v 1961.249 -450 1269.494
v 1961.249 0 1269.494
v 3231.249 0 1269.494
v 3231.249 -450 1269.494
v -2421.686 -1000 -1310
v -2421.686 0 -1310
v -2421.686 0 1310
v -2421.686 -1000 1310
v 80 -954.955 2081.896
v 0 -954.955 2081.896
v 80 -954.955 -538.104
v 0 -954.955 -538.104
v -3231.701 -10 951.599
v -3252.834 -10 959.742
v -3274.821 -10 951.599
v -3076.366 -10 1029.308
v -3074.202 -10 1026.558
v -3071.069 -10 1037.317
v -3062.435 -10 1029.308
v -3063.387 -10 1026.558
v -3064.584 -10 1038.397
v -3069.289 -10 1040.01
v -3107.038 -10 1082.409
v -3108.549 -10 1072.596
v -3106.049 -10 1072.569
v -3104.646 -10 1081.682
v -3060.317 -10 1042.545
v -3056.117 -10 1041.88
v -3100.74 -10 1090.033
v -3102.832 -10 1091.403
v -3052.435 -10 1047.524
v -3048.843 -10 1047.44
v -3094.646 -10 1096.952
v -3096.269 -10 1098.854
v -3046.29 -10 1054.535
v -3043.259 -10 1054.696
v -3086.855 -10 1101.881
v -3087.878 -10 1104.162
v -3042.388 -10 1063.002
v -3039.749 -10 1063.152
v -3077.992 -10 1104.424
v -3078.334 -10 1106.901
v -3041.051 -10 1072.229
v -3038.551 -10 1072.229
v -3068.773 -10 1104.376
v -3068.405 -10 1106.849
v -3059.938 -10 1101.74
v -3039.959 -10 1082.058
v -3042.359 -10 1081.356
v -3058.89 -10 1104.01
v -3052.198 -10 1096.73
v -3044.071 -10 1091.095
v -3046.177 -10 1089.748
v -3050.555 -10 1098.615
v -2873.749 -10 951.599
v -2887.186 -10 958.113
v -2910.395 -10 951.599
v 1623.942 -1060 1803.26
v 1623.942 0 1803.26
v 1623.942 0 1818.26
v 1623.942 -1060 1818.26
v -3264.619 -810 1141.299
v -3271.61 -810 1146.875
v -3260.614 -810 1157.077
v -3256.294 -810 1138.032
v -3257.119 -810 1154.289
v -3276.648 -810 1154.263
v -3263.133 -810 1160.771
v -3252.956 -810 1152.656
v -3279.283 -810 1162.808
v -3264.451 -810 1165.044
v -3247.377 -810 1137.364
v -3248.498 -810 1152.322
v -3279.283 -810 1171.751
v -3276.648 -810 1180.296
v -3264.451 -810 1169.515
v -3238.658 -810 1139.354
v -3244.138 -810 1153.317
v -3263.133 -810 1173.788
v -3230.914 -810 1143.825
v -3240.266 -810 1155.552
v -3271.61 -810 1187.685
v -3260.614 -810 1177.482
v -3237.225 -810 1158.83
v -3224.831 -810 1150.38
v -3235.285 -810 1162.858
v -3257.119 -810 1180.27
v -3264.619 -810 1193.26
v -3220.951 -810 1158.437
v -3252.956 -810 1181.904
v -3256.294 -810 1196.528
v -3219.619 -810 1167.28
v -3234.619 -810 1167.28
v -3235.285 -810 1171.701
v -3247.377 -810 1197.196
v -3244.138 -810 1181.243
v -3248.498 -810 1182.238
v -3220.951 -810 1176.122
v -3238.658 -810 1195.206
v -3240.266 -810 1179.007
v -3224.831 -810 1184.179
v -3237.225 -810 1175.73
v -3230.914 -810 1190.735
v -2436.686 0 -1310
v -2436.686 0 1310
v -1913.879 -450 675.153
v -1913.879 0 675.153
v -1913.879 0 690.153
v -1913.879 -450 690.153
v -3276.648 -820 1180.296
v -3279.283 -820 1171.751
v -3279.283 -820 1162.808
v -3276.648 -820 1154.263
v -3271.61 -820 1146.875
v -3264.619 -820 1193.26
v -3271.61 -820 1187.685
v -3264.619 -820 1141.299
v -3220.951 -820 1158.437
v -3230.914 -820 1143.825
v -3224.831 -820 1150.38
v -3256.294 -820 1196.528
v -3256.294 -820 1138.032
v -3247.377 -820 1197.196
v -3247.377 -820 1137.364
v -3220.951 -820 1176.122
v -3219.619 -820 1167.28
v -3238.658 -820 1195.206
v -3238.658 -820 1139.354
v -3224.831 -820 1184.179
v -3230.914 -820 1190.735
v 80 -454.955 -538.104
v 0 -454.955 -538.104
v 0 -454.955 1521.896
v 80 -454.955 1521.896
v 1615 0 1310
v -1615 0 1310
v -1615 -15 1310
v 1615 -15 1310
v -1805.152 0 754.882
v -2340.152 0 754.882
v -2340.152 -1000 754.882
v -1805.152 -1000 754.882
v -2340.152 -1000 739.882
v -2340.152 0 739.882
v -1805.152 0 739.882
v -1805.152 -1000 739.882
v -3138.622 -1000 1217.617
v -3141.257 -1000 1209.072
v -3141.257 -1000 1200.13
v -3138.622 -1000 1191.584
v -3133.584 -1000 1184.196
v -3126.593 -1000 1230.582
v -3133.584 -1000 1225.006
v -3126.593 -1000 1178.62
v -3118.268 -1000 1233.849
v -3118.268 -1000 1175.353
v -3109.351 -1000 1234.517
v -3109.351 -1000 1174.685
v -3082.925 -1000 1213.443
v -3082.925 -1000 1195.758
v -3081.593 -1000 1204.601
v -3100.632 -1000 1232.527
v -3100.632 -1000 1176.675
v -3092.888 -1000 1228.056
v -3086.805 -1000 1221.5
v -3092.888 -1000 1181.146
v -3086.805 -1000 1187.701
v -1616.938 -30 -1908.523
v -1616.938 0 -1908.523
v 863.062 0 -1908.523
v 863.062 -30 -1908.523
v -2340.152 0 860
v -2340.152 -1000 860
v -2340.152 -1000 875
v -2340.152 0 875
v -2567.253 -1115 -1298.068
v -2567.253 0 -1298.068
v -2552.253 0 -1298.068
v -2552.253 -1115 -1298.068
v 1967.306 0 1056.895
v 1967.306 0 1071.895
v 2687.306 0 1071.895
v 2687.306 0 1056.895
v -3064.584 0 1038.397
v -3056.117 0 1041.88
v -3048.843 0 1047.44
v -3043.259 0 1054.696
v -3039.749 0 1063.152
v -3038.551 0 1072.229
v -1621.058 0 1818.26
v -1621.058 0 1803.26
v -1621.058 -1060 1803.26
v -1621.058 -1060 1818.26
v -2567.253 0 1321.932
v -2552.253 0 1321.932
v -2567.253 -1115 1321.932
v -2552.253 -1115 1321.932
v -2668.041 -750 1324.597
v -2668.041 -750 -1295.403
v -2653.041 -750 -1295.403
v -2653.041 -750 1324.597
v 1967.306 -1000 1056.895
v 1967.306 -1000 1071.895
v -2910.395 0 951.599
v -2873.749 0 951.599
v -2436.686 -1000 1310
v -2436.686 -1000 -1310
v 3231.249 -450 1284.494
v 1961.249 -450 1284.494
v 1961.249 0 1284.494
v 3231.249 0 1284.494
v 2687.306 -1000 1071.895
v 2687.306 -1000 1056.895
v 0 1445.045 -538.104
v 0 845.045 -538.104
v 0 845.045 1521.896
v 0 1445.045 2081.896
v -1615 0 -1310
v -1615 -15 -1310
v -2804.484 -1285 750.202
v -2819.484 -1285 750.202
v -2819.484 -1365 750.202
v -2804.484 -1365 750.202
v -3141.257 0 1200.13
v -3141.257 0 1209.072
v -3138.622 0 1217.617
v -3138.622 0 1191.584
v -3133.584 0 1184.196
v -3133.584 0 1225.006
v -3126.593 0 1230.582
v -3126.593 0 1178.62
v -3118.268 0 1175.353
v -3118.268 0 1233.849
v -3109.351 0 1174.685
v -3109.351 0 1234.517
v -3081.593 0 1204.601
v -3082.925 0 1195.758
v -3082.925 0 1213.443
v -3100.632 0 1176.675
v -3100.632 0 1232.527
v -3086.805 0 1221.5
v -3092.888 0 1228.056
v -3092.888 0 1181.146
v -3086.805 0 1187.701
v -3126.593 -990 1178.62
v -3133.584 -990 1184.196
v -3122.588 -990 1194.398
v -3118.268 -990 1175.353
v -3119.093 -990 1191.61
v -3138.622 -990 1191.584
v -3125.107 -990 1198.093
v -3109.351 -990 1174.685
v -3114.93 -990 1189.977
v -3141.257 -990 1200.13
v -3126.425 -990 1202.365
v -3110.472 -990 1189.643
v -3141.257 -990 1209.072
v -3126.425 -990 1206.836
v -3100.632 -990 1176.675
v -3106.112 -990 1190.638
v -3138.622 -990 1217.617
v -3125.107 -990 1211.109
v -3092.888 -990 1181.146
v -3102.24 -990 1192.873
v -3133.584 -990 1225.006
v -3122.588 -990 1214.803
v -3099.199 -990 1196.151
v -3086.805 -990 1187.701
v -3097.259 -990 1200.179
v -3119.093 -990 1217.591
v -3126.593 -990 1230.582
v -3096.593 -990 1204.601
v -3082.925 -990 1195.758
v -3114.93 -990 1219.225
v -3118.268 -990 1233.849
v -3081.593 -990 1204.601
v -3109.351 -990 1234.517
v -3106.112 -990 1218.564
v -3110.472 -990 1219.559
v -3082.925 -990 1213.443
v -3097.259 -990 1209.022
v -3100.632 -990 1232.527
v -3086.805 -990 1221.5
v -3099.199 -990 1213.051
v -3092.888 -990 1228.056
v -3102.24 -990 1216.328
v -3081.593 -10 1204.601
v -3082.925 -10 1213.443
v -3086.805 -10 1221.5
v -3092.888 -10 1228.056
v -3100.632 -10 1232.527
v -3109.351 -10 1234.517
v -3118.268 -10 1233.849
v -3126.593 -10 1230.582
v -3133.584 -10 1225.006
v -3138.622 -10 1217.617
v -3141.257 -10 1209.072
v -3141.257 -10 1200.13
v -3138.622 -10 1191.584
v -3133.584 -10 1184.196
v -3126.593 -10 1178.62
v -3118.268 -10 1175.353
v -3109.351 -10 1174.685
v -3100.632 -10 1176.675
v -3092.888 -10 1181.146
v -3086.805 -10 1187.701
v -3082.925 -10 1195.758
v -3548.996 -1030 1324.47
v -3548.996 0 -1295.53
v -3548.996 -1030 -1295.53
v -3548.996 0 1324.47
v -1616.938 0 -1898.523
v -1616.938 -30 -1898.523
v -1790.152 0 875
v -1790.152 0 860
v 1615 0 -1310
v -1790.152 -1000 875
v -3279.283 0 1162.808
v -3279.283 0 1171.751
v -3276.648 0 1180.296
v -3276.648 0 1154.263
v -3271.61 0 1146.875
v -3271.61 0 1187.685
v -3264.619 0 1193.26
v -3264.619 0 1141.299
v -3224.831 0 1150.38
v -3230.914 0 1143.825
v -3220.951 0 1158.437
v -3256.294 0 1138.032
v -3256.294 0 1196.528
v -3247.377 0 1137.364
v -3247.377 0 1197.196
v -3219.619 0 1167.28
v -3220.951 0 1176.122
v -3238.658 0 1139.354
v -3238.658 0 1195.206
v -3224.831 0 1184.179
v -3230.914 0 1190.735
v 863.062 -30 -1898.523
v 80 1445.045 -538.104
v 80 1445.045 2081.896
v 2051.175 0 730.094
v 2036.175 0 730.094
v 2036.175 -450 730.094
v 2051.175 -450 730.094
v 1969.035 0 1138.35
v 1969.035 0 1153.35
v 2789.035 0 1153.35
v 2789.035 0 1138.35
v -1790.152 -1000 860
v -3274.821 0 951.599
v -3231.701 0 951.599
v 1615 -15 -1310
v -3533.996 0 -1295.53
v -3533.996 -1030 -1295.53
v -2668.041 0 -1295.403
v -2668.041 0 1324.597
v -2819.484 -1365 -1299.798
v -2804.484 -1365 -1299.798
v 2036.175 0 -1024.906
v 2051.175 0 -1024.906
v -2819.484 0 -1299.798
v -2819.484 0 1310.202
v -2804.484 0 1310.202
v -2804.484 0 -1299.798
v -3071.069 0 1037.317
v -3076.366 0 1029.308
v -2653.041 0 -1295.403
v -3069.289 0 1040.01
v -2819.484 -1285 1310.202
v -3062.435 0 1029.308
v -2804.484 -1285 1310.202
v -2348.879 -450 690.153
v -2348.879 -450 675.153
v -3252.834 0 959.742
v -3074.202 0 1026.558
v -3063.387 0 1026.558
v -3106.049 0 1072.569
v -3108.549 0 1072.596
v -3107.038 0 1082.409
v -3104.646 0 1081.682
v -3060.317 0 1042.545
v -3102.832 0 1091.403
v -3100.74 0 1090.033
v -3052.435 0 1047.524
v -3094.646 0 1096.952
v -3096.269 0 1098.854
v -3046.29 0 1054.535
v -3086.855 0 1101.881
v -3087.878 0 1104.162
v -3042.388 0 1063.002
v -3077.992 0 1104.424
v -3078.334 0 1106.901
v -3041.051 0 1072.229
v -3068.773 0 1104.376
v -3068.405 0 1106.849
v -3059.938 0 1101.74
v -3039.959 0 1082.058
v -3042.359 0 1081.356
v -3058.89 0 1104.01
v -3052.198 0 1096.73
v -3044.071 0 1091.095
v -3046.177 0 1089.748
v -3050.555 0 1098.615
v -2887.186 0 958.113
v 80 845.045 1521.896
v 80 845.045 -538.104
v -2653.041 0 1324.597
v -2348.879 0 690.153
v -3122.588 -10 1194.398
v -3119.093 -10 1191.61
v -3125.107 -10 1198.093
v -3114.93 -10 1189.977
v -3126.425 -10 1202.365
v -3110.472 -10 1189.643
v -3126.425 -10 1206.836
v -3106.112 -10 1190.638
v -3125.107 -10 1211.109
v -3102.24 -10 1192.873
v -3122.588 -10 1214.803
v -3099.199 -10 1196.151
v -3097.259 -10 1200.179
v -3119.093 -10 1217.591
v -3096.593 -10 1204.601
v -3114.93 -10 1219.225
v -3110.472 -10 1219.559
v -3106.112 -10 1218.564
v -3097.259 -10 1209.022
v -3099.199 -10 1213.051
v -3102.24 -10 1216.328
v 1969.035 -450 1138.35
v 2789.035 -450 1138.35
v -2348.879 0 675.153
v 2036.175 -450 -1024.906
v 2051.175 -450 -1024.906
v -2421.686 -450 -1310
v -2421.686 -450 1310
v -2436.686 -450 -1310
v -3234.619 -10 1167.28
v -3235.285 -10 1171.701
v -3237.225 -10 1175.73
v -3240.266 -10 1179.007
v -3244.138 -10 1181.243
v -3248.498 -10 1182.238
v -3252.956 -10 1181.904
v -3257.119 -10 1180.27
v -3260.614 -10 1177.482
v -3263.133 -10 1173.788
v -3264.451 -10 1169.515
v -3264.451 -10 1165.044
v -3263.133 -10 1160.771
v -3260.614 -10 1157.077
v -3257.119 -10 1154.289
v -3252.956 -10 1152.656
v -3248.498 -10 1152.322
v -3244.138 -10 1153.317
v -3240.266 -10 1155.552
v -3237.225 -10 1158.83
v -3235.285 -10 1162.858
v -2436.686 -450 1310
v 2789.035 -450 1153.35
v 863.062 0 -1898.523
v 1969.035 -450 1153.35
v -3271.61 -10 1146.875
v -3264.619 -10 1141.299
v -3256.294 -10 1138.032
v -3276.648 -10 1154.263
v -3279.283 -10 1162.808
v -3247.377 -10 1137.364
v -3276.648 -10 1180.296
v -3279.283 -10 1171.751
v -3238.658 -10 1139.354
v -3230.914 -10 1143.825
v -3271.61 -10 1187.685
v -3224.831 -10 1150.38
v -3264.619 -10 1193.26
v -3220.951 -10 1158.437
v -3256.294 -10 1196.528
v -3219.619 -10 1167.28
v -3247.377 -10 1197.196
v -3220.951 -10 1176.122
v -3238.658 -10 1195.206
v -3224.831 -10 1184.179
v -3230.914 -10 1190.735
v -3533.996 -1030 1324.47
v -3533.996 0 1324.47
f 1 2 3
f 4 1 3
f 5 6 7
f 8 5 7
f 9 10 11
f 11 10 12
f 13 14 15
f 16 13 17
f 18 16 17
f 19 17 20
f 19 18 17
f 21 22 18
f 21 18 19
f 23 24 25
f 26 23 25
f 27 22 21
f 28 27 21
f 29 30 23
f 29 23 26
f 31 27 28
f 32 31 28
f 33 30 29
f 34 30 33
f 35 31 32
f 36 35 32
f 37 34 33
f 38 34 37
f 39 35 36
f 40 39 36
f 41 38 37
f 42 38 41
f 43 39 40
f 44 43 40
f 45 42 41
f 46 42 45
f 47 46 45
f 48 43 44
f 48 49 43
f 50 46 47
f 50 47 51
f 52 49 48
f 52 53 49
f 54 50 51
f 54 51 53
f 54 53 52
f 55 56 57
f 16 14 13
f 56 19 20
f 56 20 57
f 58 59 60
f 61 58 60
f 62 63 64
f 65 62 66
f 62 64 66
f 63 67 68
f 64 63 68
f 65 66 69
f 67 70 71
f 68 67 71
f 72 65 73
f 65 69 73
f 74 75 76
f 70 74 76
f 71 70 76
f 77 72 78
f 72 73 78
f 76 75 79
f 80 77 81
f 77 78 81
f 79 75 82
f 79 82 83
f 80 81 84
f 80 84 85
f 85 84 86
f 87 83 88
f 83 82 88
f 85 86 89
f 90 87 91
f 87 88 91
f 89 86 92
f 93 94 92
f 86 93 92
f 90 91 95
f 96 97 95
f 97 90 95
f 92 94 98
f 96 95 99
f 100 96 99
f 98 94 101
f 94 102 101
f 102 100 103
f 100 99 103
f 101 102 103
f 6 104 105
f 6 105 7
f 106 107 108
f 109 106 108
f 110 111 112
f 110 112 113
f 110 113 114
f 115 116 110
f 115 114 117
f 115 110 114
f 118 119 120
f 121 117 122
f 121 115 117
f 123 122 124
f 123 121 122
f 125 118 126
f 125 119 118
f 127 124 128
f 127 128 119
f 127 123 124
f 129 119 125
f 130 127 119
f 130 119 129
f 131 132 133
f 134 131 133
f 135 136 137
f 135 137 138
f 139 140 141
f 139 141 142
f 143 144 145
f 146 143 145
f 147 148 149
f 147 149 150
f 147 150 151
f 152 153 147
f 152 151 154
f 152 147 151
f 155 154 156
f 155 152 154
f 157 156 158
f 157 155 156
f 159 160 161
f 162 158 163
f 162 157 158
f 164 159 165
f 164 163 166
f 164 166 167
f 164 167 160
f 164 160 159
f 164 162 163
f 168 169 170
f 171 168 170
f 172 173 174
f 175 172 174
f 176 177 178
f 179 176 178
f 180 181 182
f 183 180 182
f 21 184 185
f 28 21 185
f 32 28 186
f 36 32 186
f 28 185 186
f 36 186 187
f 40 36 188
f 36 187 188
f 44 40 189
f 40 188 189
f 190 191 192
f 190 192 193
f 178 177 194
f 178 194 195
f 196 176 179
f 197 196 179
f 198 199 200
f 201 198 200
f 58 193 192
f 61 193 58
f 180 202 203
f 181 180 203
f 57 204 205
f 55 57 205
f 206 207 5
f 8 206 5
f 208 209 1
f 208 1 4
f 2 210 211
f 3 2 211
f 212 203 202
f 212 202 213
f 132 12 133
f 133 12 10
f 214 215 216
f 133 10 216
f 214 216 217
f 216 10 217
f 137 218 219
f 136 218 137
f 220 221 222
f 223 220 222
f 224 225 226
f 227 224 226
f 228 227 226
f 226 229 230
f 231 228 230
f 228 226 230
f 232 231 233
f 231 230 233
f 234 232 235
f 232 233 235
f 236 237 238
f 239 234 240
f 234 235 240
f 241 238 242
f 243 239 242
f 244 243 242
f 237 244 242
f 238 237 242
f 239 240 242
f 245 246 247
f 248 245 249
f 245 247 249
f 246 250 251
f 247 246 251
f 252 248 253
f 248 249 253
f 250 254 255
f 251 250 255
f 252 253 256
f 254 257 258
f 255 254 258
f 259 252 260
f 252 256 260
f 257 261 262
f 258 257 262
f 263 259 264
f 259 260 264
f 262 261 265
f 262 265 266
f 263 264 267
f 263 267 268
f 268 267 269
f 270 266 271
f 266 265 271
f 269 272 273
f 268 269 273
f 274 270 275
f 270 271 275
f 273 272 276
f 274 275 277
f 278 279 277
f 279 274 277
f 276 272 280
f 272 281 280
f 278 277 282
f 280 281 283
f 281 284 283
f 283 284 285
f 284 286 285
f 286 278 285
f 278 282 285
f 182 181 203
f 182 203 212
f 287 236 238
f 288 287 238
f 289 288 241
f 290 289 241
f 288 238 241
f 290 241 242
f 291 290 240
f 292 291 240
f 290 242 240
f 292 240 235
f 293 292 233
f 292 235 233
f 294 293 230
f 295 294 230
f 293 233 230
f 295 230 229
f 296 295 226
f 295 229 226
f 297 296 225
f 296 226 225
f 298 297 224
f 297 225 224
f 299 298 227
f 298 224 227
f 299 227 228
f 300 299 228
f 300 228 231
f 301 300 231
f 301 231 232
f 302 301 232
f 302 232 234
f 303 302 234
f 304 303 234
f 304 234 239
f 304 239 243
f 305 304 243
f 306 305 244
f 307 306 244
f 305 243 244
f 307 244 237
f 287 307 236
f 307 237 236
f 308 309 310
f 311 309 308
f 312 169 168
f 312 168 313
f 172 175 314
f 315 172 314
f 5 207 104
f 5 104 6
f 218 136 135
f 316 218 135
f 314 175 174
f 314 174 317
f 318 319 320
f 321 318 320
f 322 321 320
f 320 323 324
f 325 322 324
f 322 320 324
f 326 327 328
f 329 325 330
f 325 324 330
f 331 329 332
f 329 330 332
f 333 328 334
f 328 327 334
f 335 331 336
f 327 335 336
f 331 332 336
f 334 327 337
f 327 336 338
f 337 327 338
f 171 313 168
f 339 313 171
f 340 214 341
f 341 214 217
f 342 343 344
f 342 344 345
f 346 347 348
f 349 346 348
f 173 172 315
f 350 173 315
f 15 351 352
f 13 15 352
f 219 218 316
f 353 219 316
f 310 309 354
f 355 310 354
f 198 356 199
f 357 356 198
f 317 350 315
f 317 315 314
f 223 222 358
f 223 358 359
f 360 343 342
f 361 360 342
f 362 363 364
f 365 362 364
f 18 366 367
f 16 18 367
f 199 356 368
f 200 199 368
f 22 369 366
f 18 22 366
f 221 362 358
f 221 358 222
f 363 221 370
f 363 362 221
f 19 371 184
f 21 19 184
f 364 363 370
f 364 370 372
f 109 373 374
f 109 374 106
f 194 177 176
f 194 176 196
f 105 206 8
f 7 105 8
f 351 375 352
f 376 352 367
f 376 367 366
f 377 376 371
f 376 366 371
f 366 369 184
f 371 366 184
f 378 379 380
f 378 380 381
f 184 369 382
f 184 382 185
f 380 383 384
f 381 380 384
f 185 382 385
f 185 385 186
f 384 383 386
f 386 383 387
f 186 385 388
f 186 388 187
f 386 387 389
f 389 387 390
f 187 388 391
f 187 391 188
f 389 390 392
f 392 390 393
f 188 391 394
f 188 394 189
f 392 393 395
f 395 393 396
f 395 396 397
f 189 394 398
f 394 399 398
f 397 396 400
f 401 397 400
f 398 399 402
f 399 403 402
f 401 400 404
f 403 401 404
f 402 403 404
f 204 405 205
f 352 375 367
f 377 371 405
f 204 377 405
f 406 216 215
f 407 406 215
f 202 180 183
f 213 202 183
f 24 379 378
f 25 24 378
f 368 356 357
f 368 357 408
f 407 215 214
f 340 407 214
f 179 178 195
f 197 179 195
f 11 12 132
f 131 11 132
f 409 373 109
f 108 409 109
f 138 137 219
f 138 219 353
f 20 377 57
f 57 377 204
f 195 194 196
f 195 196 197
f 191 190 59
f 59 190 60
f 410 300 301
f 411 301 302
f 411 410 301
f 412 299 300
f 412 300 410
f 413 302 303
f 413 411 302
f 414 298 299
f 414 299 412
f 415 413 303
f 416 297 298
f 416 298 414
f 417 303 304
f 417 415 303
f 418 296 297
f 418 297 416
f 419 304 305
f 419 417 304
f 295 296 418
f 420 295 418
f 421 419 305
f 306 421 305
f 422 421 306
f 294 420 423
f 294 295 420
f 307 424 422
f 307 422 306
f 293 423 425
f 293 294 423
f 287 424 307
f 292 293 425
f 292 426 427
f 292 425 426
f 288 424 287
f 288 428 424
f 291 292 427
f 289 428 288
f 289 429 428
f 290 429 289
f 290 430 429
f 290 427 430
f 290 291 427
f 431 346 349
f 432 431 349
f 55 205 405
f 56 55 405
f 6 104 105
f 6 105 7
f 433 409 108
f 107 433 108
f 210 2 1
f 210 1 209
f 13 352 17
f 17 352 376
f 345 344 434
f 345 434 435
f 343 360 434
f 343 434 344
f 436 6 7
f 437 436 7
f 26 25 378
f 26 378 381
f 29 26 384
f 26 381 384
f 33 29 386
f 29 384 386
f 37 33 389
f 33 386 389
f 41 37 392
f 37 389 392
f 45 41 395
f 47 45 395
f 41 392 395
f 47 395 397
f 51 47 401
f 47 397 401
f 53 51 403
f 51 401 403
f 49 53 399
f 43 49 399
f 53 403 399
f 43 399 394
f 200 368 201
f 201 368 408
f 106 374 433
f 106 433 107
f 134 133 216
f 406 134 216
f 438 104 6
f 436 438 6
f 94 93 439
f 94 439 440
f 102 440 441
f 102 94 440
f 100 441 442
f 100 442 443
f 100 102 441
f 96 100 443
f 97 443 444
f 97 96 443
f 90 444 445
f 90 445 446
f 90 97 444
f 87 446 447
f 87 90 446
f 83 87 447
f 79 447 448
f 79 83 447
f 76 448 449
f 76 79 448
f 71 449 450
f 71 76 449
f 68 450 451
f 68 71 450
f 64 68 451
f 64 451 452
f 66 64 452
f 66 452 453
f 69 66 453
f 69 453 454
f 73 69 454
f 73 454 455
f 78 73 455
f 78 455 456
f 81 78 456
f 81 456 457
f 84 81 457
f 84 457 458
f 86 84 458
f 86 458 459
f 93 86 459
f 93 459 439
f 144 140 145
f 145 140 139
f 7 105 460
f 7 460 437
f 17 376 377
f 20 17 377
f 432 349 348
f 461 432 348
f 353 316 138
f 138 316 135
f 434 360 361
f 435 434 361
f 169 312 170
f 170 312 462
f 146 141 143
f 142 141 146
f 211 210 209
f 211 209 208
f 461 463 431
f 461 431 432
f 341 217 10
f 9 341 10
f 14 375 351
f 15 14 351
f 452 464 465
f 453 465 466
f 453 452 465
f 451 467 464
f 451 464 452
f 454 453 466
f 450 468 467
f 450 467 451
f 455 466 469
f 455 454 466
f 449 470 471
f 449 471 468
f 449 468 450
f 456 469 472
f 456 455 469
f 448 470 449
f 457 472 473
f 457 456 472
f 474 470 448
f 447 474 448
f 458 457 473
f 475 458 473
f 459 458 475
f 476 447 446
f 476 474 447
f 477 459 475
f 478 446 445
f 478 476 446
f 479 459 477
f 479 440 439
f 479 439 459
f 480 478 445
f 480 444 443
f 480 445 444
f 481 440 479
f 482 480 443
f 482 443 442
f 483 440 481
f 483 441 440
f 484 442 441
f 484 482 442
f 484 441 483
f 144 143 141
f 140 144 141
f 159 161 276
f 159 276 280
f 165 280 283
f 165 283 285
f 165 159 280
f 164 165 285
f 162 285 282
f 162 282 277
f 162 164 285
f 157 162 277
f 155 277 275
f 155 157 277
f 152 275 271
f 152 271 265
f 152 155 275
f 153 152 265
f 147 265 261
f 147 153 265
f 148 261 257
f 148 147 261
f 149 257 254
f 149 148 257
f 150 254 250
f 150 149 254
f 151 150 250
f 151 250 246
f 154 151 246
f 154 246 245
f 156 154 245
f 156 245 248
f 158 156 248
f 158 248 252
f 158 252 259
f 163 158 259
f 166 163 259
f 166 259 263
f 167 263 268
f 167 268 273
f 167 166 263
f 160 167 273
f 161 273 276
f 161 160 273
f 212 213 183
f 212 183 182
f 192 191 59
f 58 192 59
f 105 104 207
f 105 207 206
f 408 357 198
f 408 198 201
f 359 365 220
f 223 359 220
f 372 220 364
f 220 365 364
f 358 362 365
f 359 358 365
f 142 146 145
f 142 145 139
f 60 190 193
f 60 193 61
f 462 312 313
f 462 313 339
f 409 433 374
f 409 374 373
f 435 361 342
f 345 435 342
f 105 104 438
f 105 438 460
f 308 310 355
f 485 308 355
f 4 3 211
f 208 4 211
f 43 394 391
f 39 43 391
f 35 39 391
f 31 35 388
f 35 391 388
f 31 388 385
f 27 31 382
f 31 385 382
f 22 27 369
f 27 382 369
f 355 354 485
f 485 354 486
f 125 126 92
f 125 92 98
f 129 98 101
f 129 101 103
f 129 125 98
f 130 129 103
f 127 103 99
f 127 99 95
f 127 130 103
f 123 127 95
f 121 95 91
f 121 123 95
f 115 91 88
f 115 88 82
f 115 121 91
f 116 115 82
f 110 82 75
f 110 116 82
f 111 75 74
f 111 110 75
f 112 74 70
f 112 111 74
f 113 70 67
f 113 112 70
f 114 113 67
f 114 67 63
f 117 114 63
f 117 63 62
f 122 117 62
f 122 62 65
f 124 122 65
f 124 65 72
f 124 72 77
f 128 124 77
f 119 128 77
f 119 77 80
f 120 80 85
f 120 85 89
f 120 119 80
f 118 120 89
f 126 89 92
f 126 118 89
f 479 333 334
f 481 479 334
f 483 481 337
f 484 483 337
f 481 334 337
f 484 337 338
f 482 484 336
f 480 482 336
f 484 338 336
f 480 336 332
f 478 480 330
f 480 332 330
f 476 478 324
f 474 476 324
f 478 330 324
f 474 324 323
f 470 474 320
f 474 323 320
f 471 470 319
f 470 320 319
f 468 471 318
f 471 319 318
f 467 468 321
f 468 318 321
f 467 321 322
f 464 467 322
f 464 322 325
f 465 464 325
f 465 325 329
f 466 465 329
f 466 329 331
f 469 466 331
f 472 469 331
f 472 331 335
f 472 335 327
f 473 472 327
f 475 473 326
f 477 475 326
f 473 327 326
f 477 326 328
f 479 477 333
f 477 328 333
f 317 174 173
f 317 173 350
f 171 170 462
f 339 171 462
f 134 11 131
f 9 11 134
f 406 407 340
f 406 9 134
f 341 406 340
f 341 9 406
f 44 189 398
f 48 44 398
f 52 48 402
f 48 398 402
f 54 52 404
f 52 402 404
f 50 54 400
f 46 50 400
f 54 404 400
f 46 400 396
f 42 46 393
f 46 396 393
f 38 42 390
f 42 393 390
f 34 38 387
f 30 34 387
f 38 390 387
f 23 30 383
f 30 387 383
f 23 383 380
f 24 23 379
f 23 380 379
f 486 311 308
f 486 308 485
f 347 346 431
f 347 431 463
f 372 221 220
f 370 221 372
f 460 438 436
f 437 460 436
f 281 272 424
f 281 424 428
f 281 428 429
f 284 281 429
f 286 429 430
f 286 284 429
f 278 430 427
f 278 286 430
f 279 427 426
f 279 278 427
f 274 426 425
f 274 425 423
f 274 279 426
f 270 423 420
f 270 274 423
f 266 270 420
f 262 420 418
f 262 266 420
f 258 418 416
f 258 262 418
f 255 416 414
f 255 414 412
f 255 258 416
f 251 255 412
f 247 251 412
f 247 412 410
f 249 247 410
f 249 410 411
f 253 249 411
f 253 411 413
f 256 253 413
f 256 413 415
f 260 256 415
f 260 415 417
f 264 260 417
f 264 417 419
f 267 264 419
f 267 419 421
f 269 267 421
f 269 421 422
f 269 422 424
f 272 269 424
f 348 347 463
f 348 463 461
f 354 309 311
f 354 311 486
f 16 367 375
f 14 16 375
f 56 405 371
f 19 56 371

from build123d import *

# Parameters (mm, degrees)
F0_W      = 3230
F0_H      = 2620
F1_DEPTH  = 15
F3_DEPTH  = 80
F0_W_2    = 15
F4_DEPTH  = 1000
F5_DEPTH  = 450
F0_W_3    = 550
F0_H_2    = 15
F6_DEPTH  = 1000
F0_W_4    = 535
F7_DEPTH  = 1000
F8_DEPTH  = 1115
F0_R      = 30
F0_R_2    = 15
F9_DEPTH  = 10
F10_DEPTH = 500
F12_DEPTH = 10
F0_W_5    = 1270
F13_DEPTH = 450
F0_H_3    = 1755
F14_DEPTH = 450
F0_W_6    = 820
F15_DEPTH = 450
F16_DEPTH = 10
F17_DEPTH = 410
F0_W_7    = 435
F19_DEPTH = 450
F0_W_8    = 720
F20_DEPTH = 1000
F21_DEPTH = 750
F0_W_9    = 2480
F0_H_4    = 10
F22_DEPTH = 30
F0_H_5    = 2610
F23_DEPTH = 1365
F24_W     = 80
F24_H     = 560
F25_DEPTH = 25
F0_W_10   = 3245
F26_DEPTH = 1060
F27_DEPTH = 1030


with BuildPart() as f1:
    # F0 (on Front) → F1 (new body)
    with BuildSketch(Plane.XZ):
        Rectangle(F0_W, F0_H)
    extrude(amount=F1_DEPTH)


with BuildPart() as f3:
    # F2 (on Right) → F3 (new body)
    with BuildSketch(Plane.YZ):
        Polygon((845.044619, -538.103774), (1445.044619, -538.103774), (1445.044619, 2081.896226), (-954.955381, 2081.896226), (-954.955381, -538.103774), (-454.955381, -538.103774), (-454.955381, 1521.896226), (845.044619, 1521.896226), align=None)
    extrude(amount=F3_DEPTH)


with BuildPart() as f4:
    # F0 (on Front) → F4 (new body)
    with BuildSketch(Plane.XZ):
        with Locations((-2429.186039, 0)):
            Rectangle(F0_W_2, F0_H)
    extrude(amount=F4_DEPTH)


with BuildPart() as f5:
    # F0 (on Front) → F5 (new body)
    with BuildSketch(Plane.XZ):
        with Locations((-2429.186039, 0)):
            Rectangle(F0_W_2, F0_H)
    extrude(amount=F5_DEPTH)


with BuildPart() as f6:
    # F0 (on Front) → F6 (new body)
    with BuildSketch(Plane.XZ):
        with Locations((-2065.152264, 867.5)):
            Rectangle(F0_W_3, F0_H_2)
    extrude(amount=F6_DEPTH)


with BuildPart() as f7:
    # F0 (on Front) → F7 (new body)
    with BuildSketch(Plane.XZ):
        with Locations((-2072.652264, 747.38241)):
            Rectangle(F0_W_4, F0_H_2)
    extrude(amount=F7_DEPTH)


with BuildPart() as f8:
    # F0 (on Front) → F8 (new body)
    with BuildSketch(Plane.XZ):
        with Locations((-2559.75318, 11.931922)):
            Rectangle(F0_W_2, F0_H)
    extrude(amount=F8_DEPTH)


with BuildPart() as f9:
    # F0 (on Front) → F9 (new body)
    with BuildSketch(Plane.XZ):
        with Locations((-3111.592531, 1204.600811)):
            Circle(F0_R)
        with Locations((-3111.592531, 1204.600811)):
            Circle(F0_R_2, mode=Mode.SUBTRACT)
    extrude(amount=F9_DEPTH)

    # F0 (on Front) → F10 (join)
    with BuildSketch(Plane.XZ):
        with Locations((-3111.592531, 1204.600811)):
            Circle(F0_R_2)
    extrude(amount=F10_DEPTH)

    # F11: F9 across face


with BuildPart() as f9_1:
    add(f9.part)
    add(f9.part.mirror(Plane(origin=(-3111.592531, -500, 1204.600811), x_dir=(1, 0, 0), z_dir=(0, -1, 0))))


with BuildPart() as f12:
    # F0 (on Front) → F12 (new body)
    with BuildSketch(Plane.XZ):
        with BuildLine():
            ThreePointArc((-3064.584009, 1038.397153), (-3045.812575, 1050.884731), (-3038.551055, 1072.228974))
            ThreePointArc((-3038.551055, 1072.228974), (-3073.367749, 1107.228494), (-3108.549135, 1072.595582))
            Line((-3108.549135, 1072.595582), (-3106.049273, 1072.569396))
            ThreePointArc((-3106.049273, 1072.569396), (-3073.380842, 1104.728528), (-3041.051055, 1072.228974))
            ThreePointArc((-3041.051055, 1072.228974), (-3049.109465, 1050.807988), (-3069.288511, 1040.009714))
            Line((-3069.288511, 1040.009714), (-3071.06935, 1037.317069))
            ThreePointArc((-3071.06935, 1037.317069), (-3067.801262, 1037.704492), (-3064.584009, 1038.397153))
        make_face()
        with BuildLine():
            Line((-3062.434912, 1029.3082), (-3064.584009, 1038.397153))
            ThreePointArc((-3064.584009, 1038.397153), (-3067.801262, 1037.704492), (-3071.06935, 1037.317069))
            Line((-3071.06935, 1037.317069), (-3076.366186, 1029.3082))
            Line((-3076.366186, 1029.3082), (-3252.833605, 959.742129))
            Line((-3252.833605, 959.742129), (-3274.821281, 951.598525))
            Line((-3274.821281, 951.598525), (-3231.701181, 951.598525))
            Line((-3231.701181, 951.598525), (-3074.202299, 1026.557922))
            Line((-3074.202299, 1026.557922), (-3063.386917, 1026.557922))
            Line((-3063.386917, 1026.557922), (-2910.394669, 951.598525))
            Line((-2910.394669, 951.598525), (-2873.748541, 951.598525))
            Line((-2873.748541, 951.598525), (-2887.185574, 958.113372))
            Line((-2887.185574, 958.113372), (-3062.434912, 1029.3082))
        make_face()
    extrude(amount=F12_DEPTH)


with BuildPart() as f13:
    # F0 (on Front) → F13 (new body)
    with BuildSketch(Plane.XZ):
        with Locations((2596.248517, 1276.993699)):
            Rectangle(F0_W_5, F0_H_2)
    extrude(amount=F13_DEPTH)


with BuildPart() as f14:
    # F0 (on Front) → F14 (new body)
    with BuildSketch(Plane.XZ):
        with Locations((2043.675013, -147.40592)):
            Rectangle(F0_W_2, F0_H_3)
    extrude(amount=F14_DEPTH)


with BuildPart() as f15:
    # F0 (on Front) → F15 (new body)
    with BuildSketch(Plane.XZ):
        with Locations((2379.035149, 1145.850129)):
            Rectangle(F0_W_6, F0_H_2)
    extrude(amount=F15_DEPTH)


with BuildPart() as f16:
    # F0 (on Front) → F16 (new body)
    with BuildSketch(Plane.XZ):
        with Locations((-3249.61853, 1167.27972)):
            Circle(F0_R)
        with Locations((-3249.61853, 1167.27972)):
            Circle(F0_R_2, mode=Mode.SUBTRACT)
    extrude(amount=F16_DEPTH)

    # F0 (on Front) → F17 (join)
    with BuildSketch(Plane.XZ):
        with Locations((-3249.61853, 1167.27972)):
            Circle(F0_R_2)
    extrude(amount=F17_DEPTH)

    # F18: F16 across face


with BuildPart() as f16_1:
    add(f16.part)
    add(f16.part.mirror(Plane(origin=(-3249.61853, -410, 1167.27972), x_dir=(1, 0, 0), z_dir=(0, -1, 0))))


with BuildPart() as f19:
    # F0 (on Front) → F19 (new body)
    with BuildSketch(Plane.XZ):
        with Locations((-2131.379099, 682.653434)):
            Rectangle(F0_W_7, F0_H_2)
    extrude(amount=F19_DEPTH)


with BuildPart() as f20:
    # F0 (on Front) → F20 (new body)
    with BuildSketch(Plane.XZ):
        with Locations((2327.306256, 1064.39466)):
            Rectangle(F0_W_8, F0_H_2)
    extrude(amount=F20_DEPTH)


with BuildPart() as f21:
    # F0 (on Front) → F21 (new body)
    with BuildSketch(Plane.XZ):
        with Locations((-2660.541229, 14.597235)):
            Rectangle(F0_W_2, F0_H)
    extrude(amount=F21_DEPTH)


with BuildPart() as f22:
    # F0 (on Front) → F22 (new body)
    with BuildSketch(Plane.XZ):
        with Locations((-376.937518, -1903.522964)):
            Rectangle(F0_W_9, F0_H_4)
    extrude(amount=F22_DEPTH)


with BuildPart() as f23:
    # F0 (on Front) → F23 (new body)
    with BuildSketch(Plane.XZ):
        with Locations((-2811.983995, 5.202346)):
            Rectangle(F0_W_2, F0_H_5)
    extrude(amount=F23_DEPTH)

    # F24 (on face) → F25 (cut)
    with BuildSketch(Plane(origin=(-2819.483995, 0, 0), x_dir=(0, -1, 0), z_dir=(-1, 0, 0))):
        with Locations((1325, 1030.202346)):
            Rectangle(F24_W, F24_H)
    extrude(amount=-F25_DEPTH, mode=Mode.SUBTRACT)


with BuildPart() as f26:
    # F0 (on Front) → F26 (new body)
    with BuildSketch(Plane.XZ):
        with Locations((1.442251, 1810.75985)):
            Rectangle(F0_W_10, F0_H_2)
    extrude(amount=F26_DEPTH)


with BuildPart() as f27:
    # F0 (on Front) → F27 (new body)
    with BuildSketch(Plane.XZ):
        with Locations((-3541.495733, 14.469562)):
            Rectangle(F0_W_2, F0_H)
    extrude(amount=F27_DEPTH)


solid = Compound([f1.part, f3.part, f4.part, f5.part, f6.part, f7.part, f8.part, f9_1.part, f12.part, f13.part, f14.part, f15.part, f16_1.part, f19.part, f20.part, f21.part, f22.part, f23.part, f26.part, f27.part])
